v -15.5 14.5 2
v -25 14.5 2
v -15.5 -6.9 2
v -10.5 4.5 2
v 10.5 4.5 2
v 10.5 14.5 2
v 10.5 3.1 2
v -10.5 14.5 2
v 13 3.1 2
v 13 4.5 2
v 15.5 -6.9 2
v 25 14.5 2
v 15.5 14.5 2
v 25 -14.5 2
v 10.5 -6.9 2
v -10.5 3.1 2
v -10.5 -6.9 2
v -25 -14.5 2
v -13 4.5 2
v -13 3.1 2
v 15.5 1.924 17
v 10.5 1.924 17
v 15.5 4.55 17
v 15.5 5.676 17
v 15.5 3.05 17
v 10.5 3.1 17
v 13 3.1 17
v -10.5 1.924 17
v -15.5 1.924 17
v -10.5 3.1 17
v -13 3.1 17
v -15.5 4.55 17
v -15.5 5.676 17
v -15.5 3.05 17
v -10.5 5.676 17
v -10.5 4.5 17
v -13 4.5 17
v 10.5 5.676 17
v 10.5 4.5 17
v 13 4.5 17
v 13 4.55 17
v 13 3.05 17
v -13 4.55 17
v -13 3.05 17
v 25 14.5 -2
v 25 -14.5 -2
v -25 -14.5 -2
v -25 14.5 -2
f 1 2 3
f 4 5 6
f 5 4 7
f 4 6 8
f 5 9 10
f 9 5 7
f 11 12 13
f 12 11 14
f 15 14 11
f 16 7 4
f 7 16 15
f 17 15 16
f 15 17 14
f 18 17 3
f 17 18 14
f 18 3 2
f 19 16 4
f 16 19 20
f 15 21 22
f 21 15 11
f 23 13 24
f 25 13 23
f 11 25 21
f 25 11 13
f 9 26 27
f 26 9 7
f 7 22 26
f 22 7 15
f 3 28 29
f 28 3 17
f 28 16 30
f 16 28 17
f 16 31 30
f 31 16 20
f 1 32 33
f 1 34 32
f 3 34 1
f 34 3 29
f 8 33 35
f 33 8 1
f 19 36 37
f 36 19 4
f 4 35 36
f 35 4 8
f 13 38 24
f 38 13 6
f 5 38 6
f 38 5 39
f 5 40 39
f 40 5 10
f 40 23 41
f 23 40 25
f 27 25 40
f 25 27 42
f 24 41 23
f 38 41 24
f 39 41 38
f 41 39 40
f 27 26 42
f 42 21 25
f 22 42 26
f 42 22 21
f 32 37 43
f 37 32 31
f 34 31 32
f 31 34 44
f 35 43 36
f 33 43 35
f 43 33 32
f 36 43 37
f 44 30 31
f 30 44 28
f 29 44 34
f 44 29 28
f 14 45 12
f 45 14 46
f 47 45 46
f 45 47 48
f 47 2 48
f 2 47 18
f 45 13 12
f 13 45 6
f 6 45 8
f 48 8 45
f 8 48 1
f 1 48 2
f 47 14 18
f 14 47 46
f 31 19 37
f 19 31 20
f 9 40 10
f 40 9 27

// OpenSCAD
module triangle(l, w, h) {
    polyhedron(
        points=[[0,0,0], [l,0,0], [l,w,0], [0,w,0], [0,w,h], [l,w,h]],
        faces=[[0,1,2,3],[5,4,3,2],[0,4,5,1],[0,3,4],[5,2,1]]
    );
}

cube([50, 29, 4], true);


difference() {
    union() {
        translate([10.5,-6.9,2]) triangle(5, 10,17);
        translate([-15.5,-6.9,2]) triangle(5, 10,17);

        rotate(180) translate([10.5,-14.5,2]) triangle(5, 10,17);
        rotate(180) translate([-15.5,-14.5,2]) triangle(5, 10,17);
    }
    translate([0,3.8,18]) cube([32,20,2], true);
}

translate([-14.25,3.8,9.5]) cube([2.5,1.5,15], true);
translate([14.25,3.8,9.5]) cube([2.5,1.5,15], true);
